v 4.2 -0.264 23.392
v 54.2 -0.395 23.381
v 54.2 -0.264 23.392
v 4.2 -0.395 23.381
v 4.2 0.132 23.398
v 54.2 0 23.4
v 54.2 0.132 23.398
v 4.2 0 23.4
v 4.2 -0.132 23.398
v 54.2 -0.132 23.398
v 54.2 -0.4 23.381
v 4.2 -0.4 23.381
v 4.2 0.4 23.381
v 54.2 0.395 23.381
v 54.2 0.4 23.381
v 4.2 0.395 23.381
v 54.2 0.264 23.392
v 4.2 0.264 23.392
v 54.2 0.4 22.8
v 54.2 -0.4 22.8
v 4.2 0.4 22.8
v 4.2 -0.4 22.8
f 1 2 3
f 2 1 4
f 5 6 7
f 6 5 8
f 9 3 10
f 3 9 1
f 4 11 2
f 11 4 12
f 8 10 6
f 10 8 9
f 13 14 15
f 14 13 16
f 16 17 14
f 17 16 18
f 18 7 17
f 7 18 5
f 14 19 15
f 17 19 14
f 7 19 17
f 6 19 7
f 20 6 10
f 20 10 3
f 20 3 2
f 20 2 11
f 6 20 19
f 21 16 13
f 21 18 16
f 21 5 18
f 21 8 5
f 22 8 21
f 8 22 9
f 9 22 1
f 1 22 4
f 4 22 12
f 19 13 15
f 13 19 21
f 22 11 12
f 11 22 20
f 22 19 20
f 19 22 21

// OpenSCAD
fr1 = 7.6/2;     //filterBox 出水口外径
fr0 = fr1 - 0.8;  //filterBox 出水口内径
pipe_out_l = 15; //filterBox 出水口长度

r0 = fr1+0.4;
r1 = r0+0.8;
pl_1 = pipe_out_l;

pl_2 = 50;

$fn = 200;

module connecter1_su(r_in, r_out, l, r1_in, r1_out, l1){

    cylinder(r=r_in, h=l+(r_out-r_in)+r_in );

    translate([r_in, 0, l+r_in+(r_out-r_in)]) {
        rotate([0, 90, 0]) {
            cylinder(r=fr0, h=l1);
        }
    }
}

module connecter1(r_in, r_out, l, r1_in, r1_out, l1){

    cylinder(r=r_out, h=l);
    translate([0, 0, l+r_out]) {
        cube(size=[r_out*2, r_out*2, r_out*2], center=true);
    }

    translate([r_in, 0, l+r_in+(r_out-r_in)]) {
        rotate([0, 90, 0]) {
            cylinder(r=r1_out, h=l1);
        }
    }
}

//卡位
module gap(r_in, r_out, l, r1_in, r1_out, l1){
    translate([r_in, 0, l+r_in+(r_out-r_in)]) {        
        rotate([0, 90, 0]) {
            difference(){
                cylinder(r=r1_out, h=l1);
                translate([-r1_out, 0.4, 0]) {
                    cube(size=[r1_out*2, r1_out, l1]);
  
                }
                translate([-r1_out, -0.4-r1_out, 0]) {
                    cube(size=[r1_out*2, r1_out, l1]);
                }
                translate([-r1_out+0.6, -0.5, 0]) {
                    cube(size=[r1_out*2, 1, l1]);
                }
            }
        }
    }
}

// difference(){
//     connecter1(r0, r1, pipe_out_l-0.8, fr0, fr1+0.4, 50);
//     connecter1_su(r0, r1, pipe_out_l-0.8, fr0, fr1, 50);
    gap(r0, r1, pipe_out_l-0.8, fr0, fr1+0.4, 50);

// }
